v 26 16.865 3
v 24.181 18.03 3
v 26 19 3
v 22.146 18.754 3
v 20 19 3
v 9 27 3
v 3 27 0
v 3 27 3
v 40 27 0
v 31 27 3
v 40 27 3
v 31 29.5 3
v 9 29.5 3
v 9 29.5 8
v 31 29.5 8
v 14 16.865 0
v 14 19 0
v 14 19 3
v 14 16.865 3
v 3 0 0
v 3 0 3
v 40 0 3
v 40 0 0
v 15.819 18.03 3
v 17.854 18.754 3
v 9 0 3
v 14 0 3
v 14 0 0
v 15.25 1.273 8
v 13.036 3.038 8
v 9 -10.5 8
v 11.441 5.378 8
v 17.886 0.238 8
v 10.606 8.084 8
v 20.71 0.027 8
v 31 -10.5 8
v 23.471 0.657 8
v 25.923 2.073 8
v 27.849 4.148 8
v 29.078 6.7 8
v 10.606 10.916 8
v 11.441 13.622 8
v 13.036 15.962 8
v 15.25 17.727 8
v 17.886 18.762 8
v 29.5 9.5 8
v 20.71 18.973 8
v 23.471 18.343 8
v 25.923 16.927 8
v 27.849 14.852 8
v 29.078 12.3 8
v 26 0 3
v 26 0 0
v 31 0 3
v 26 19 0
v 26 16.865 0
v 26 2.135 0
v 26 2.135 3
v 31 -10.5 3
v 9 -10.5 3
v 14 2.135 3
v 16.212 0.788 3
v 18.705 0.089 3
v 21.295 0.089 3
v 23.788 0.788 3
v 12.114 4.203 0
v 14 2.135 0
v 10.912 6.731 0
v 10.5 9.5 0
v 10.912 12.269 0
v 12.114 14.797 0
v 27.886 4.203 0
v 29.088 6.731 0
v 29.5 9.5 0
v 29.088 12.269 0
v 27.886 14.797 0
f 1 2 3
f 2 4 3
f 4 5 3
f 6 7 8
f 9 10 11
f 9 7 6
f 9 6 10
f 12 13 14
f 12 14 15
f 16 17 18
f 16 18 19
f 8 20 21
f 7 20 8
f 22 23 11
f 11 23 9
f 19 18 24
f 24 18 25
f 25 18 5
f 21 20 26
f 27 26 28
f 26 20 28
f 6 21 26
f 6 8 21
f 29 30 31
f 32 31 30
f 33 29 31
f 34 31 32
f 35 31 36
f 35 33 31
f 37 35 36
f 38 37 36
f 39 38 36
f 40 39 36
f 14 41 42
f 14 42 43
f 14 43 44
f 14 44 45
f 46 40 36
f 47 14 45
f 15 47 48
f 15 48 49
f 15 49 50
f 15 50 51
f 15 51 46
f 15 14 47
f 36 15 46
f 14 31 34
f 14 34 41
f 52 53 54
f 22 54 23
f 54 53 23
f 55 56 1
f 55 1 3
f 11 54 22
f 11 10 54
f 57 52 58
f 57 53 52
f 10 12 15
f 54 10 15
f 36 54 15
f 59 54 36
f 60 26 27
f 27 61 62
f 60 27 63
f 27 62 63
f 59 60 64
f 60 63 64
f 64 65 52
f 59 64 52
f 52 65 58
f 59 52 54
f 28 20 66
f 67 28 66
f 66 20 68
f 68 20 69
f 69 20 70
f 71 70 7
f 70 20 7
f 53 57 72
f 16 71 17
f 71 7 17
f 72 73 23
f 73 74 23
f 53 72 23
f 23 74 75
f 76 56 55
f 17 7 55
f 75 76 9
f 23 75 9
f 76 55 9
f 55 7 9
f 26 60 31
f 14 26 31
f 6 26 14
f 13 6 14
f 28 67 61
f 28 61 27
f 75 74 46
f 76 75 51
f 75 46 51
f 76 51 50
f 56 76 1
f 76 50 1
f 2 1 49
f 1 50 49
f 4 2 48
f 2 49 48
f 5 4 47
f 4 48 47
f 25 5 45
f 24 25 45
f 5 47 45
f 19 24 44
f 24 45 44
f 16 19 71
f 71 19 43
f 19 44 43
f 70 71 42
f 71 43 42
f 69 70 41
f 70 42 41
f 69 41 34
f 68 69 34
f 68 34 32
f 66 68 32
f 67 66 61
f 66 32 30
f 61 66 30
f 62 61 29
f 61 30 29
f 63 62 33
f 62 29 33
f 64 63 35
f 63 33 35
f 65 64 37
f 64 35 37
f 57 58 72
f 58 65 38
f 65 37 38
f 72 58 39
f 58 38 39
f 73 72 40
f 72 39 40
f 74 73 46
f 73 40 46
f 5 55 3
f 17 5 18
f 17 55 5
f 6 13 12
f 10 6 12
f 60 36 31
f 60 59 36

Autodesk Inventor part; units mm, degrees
ref_plane "YZ Plane" through (0, 0, 0) normal (1, 0, 0) x (0, 1, 0)
ref_plane "XZ Plane" through (0, 0, 0) normal (0, 1, 0) x (-1, 0, 0)
ref_plane "Arbeitsebene1" through (0, 0, 0) normal (0, 0, 1) x (1, 0, 0)
sketch "Skizze1" plane through (0, 0, 0) normal (0, 0, 1) x (1, 0, 0)
  line L0 (26, 19) -> (14, 19) projected
  line L1 (14, 19) -> (14, 0) projected
  line L2 (14, 0) -> (26, 0) projected
  line L3 (26, 0) -> (26, 19) projected
  line L4 (0, 0) -> (40, 0) projected
  line L5 (40, 0) -> (40, 42) projected
  line L6 (0, 42) -> (40, 42) projected
  line L7 (0, 0) -> (0, 42) projected
  line L8 (40, 0) -> (3, 0)
  line L9 (3, 0) -> (3, 27)
  line L10 (3, 27) -> (40, 27)
  line L11 (40, 27) -> (40, 0)
  dimension "d0" = 37
  dimension "d1" = 27
extrude "Extrusion1" add sketch "Skizze1" along normal blind 3 contours L0 L1 L4 L9 L10 L5 L3
sketch "Skizze2" plane through (0, 0, 3) normal (0, 0, 1) x (1, 0, 0)
  line L0 (14, 0) -> (14, 19) projected
  line L1 (14, 19) -> (26, 19) projected
  line L2 (26, 19) -> (26, 0) projected
  line L3 (26, 0) -> (40, 0) projected
  line L4 (40, 0) -> (40, 27) projected
  line L5 (40, 27) -> (3, 27) projected
  line L6 (3, 27) -> (3, 0) projected
  line L7 (3, 0) -> (14, 0) projected
  line L8 (9, 29.5) -> (31, 29.5)
  line L9 (31, 29.5) -> (31, -10.5)
  line L10 (31, -10.5) -> (9, -10.5)
  line L11 (9, -10.5) -> (9, 29.5)
  line L12 (9, 29.5) -> (31, -10.5) construction
  line L13 (31, 29.5) -> (9, -10.5) construction
  point P0 (0, 0)
  point P1 (20, 9.5)
  dimension "d4" = 22
  dimension "d5" = 40
extrude "Extrusion2" add sketch "Skizze2" along normal blind 5 contours L7 L11 L5 L9 L3 L2 L1 L0 | L0 L1 L2 L3 L9 L10 L11 L7 | L11 L8 L9 L5
sketch "Skizze3" plane through (0, 0, 8) normal (0, 0, 1) x (1, 0, 0)
  line L0 (14, 0) -> (14, 19) projected
  line L1 (14, 19) -> (26, 19) projected
  line L2 (26, 19) -> (26, 0) projected
  line L3 (14, 0) -> (26, 0) projected
  circle A0 centre (20, 9.5) radius 9.5
  point P0 (0, 0)
ref_plane "Arbeitsebene2" through (0, 0, 0) normal (0, 0, 1) x (1, 0, 0)
extrude "Extrusion3" cut sketch "Skizze3" against normal up to surface (8 mm away) contours A0 L0 | L0 A0 L2 | L2 A0
properties part number "04_LED_Holder"
